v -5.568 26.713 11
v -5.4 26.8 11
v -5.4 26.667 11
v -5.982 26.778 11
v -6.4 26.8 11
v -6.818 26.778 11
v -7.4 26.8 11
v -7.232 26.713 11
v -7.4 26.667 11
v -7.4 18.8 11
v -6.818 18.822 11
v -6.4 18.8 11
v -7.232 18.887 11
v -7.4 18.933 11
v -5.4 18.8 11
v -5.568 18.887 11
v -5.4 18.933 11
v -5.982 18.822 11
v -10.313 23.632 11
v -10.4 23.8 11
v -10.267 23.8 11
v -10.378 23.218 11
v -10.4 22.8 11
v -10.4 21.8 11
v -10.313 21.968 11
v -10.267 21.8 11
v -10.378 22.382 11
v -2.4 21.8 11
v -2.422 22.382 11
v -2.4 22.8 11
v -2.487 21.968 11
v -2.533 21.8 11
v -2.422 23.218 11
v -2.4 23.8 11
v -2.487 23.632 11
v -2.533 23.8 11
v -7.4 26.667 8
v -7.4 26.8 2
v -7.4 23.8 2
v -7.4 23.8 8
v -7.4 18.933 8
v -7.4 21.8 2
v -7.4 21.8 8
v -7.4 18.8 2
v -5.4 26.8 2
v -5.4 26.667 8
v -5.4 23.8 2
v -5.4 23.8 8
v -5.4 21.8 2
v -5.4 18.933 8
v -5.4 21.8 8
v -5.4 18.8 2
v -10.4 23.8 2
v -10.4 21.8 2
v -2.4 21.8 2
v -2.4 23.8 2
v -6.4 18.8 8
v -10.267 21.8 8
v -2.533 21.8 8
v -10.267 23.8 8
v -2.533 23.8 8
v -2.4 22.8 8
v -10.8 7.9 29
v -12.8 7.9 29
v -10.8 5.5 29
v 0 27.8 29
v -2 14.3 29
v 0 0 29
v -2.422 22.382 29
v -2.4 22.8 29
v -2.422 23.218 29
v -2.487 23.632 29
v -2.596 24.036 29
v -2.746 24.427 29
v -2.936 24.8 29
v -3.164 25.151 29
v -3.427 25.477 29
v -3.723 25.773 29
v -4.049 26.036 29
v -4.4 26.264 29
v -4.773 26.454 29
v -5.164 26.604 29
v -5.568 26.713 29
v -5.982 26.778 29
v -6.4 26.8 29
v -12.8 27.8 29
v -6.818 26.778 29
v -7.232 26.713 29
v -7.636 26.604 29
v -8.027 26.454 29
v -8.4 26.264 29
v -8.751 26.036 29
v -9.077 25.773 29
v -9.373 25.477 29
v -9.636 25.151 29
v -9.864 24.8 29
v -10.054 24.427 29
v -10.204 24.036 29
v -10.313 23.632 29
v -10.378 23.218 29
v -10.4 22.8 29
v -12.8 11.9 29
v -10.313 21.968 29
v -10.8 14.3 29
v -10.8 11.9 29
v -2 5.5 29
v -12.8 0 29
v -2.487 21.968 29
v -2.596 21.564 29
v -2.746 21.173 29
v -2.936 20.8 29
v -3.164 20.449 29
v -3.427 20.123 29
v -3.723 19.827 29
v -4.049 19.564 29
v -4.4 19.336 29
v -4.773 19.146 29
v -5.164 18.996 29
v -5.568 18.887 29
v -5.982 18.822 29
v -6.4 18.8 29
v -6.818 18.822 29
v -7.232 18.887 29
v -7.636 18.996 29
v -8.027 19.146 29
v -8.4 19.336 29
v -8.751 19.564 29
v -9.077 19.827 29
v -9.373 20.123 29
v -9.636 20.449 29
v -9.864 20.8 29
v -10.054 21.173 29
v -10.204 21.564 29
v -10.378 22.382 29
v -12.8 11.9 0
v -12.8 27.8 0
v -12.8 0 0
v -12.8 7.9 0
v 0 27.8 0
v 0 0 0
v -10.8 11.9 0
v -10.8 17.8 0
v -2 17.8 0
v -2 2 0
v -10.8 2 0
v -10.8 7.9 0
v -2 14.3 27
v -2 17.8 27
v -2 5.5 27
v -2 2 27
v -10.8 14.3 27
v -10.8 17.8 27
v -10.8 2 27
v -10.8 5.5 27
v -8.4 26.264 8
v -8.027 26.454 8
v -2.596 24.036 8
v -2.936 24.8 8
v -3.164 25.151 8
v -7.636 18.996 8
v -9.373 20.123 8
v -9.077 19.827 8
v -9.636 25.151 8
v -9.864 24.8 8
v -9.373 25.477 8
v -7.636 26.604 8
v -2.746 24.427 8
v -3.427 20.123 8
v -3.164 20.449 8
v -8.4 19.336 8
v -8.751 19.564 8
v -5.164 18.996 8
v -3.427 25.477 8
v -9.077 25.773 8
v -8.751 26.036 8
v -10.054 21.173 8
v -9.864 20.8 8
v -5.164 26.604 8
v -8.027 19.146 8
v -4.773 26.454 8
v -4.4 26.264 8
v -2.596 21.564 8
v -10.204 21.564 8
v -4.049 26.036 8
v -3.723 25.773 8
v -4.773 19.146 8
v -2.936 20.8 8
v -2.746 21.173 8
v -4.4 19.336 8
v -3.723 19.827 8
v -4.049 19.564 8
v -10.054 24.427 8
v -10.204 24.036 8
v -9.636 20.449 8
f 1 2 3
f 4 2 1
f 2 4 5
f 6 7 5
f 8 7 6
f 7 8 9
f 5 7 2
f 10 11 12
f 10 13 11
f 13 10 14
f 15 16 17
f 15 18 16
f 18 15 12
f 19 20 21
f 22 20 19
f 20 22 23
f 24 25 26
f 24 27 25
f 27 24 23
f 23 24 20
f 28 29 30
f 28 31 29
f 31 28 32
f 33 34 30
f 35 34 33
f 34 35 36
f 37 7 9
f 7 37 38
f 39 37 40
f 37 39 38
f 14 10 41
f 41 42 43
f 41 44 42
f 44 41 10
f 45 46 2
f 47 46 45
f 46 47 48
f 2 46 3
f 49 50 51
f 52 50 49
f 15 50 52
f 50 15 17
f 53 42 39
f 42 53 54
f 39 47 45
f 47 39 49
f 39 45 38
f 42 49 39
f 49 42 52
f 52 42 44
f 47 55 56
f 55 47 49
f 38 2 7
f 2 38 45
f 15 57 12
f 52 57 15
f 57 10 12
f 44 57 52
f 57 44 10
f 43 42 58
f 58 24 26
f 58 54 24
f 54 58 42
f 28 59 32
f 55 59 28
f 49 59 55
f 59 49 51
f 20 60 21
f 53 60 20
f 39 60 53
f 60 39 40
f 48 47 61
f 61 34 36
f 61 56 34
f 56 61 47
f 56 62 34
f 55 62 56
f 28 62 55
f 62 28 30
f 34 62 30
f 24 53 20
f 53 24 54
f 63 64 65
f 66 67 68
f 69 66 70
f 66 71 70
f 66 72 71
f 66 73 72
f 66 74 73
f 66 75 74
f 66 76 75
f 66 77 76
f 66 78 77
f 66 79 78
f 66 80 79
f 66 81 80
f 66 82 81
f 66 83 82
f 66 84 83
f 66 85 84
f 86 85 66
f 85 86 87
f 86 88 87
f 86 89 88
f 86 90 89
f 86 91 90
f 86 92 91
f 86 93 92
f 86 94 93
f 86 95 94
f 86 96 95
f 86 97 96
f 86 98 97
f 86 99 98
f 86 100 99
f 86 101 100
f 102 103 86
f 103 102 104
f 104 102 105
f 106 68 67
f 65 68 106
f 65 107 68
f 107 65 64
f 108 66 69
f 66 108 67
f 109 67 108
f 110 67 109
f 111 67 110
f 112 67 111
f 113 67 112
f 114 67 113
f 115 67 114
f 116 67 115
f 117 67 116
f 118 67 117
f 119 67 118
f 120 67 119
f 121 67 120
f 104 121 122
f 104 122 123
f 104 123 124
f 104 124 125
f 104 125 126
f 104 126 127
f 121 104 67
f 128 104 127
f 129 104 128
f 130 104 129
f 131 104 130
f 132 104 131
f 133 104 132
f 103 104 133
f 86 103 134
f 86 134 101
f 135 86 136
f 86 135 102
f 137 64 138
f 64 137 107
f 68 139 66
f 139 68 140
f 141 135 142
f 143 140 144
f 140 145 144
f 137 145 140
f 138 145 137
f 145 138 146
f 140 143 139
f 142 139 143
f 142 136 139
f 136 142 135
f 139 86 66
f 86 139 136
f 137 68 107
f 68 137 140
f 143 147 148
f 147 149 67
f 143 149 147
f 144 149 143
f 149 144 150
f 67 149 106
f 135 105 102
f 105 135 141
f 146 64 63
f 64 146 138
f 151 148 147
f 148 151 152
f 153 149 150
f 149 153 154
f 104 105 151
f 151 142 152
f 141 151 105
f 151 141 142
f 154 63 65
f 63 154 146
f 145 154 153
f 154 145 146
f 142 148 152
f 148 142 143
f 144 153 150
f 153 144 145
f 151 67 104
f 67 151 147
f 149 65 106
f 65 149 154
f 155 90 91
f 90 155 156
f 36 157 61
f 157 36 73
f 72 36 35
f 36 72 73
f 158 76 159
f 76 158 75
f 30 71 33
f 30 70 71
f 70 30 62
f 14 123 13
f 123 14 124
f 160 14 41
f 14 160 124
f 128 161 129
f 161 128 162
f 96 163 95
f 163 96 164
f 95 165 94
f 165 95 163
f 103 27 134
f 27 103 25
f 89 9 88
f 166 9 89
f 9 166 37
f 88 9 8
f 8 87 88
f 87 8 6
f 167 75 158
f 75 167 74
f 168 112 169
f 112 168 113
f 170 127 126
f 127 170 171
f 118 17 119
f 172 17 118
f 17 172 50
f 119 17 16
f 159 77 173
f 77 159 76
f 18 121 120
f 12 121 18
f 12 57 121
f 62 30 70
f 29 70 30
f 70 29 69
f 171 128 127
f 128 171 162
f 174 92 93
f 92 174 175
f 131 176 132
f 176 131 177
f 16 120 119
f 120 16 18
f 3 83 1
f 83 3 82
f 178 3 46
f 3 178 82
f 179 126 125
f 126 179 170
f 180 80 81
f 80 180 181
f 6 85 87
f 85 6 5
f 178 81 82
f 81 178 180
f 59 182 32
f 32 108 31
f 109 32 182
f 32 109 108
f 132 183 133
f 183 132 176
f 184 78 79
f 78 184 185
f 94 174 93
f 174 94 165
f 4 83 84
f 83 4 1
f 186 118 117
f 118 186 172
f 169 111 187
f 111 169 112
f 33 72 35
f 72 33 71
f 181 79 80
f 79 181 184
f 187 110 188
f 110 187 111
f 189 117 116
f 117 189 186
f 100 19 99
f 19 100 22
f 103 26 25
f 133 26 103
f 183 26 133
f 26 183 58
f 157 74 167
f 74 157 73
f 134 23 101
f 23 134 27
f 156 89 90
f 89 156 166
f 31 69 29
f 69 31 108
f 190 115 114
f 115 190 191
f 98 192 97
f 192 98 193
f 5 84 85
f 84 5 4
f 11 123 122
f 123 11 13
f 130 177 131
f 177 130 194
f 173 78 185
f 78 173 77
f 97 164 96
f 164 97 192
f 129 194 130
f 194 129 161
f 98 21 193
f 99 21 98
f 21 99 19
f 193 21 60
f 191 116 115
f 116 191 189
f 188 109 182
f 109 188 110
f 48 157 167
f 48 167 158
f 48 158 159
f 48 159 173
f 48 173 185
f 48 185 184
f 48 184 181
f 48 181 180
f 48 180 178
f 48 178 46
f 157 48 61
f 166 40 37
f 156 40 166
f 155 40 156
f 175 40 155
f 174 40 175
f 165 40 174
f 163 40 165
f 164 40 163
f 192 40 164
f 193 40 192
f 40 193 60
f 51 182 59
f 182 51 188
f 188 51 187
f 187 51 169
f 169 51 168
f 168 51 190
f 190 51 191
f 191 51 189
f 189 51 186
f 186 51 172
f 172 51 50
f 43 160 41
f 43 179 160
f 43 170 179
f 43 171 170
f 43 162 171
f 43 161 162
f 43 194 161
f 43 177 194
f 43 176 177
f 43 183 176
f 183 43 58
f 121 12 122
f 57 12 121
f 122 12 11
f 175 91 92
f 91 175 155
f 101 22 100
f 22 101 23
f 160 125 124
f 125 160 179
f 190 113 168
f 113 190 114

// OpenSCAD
//count of fragments for cylinders etc.
$fn=60;
//plug dimensions (including 1mm tolerance)
PLen=27; 
//width and height - for perfect sit, file down (including 0.8mm tolerance)
PWit=15.8;
PHig=8.8;
//cable diameter
CDia=4; 
//additional cutout right (including 0.8mm tolerance)
ACutR=8.8; 
//screwdriver/stick diameter (including 1mm tolerance)
StDia=8;

rotate([0,270,0]) //suggested print orientation - alternatively enable print support below - hint: if you print in other direction, possibly you have to change the tolerances
difference(){
    translate([0,0,0])
    cube([PLen+2,PWit+4+StDia,PHig+4]);
    
    //cable
    translate([-5,PWit/2,2])
    cube([PLen+12,CDia,PHig+4]);
    
    //plug
    translate([-2,2,2])
    cube([PLen+2,PWit,PHig]);
    
    //additional cutout right
    translate([10,(PWit+4-ACutR)/2,(PHig+4-ACutR)/2])
    cube([PLen,ACutR,ACutR]);
    
    //hole for stick
    translate([StDia,PWit+3+StDia/2,(PHig+4)/2])
    rotate([0,90,0])
    cylinder(h=PLen,d=StDia);
    //slits
    translate([2,PWit+3,PHig/2+1]){
        cube([StDia+1,StDia,2]);
        translate([0,StDia/2+1,-(StDia)/2+1])
        rotate([90,0,0])
        cube([StDia+1,StDia,2]);
    }
}

/*/print support inside
translate([3,4,2.8])
PrnSupport(PLen-6,PWit-4,PHig-1,5); //*/

module PrnSupport(x,y,z,step) {
    for (xl=[0:step:x]) {
        translate([xl,0,0])
        cube([0.5,y,z]);
    }
}
